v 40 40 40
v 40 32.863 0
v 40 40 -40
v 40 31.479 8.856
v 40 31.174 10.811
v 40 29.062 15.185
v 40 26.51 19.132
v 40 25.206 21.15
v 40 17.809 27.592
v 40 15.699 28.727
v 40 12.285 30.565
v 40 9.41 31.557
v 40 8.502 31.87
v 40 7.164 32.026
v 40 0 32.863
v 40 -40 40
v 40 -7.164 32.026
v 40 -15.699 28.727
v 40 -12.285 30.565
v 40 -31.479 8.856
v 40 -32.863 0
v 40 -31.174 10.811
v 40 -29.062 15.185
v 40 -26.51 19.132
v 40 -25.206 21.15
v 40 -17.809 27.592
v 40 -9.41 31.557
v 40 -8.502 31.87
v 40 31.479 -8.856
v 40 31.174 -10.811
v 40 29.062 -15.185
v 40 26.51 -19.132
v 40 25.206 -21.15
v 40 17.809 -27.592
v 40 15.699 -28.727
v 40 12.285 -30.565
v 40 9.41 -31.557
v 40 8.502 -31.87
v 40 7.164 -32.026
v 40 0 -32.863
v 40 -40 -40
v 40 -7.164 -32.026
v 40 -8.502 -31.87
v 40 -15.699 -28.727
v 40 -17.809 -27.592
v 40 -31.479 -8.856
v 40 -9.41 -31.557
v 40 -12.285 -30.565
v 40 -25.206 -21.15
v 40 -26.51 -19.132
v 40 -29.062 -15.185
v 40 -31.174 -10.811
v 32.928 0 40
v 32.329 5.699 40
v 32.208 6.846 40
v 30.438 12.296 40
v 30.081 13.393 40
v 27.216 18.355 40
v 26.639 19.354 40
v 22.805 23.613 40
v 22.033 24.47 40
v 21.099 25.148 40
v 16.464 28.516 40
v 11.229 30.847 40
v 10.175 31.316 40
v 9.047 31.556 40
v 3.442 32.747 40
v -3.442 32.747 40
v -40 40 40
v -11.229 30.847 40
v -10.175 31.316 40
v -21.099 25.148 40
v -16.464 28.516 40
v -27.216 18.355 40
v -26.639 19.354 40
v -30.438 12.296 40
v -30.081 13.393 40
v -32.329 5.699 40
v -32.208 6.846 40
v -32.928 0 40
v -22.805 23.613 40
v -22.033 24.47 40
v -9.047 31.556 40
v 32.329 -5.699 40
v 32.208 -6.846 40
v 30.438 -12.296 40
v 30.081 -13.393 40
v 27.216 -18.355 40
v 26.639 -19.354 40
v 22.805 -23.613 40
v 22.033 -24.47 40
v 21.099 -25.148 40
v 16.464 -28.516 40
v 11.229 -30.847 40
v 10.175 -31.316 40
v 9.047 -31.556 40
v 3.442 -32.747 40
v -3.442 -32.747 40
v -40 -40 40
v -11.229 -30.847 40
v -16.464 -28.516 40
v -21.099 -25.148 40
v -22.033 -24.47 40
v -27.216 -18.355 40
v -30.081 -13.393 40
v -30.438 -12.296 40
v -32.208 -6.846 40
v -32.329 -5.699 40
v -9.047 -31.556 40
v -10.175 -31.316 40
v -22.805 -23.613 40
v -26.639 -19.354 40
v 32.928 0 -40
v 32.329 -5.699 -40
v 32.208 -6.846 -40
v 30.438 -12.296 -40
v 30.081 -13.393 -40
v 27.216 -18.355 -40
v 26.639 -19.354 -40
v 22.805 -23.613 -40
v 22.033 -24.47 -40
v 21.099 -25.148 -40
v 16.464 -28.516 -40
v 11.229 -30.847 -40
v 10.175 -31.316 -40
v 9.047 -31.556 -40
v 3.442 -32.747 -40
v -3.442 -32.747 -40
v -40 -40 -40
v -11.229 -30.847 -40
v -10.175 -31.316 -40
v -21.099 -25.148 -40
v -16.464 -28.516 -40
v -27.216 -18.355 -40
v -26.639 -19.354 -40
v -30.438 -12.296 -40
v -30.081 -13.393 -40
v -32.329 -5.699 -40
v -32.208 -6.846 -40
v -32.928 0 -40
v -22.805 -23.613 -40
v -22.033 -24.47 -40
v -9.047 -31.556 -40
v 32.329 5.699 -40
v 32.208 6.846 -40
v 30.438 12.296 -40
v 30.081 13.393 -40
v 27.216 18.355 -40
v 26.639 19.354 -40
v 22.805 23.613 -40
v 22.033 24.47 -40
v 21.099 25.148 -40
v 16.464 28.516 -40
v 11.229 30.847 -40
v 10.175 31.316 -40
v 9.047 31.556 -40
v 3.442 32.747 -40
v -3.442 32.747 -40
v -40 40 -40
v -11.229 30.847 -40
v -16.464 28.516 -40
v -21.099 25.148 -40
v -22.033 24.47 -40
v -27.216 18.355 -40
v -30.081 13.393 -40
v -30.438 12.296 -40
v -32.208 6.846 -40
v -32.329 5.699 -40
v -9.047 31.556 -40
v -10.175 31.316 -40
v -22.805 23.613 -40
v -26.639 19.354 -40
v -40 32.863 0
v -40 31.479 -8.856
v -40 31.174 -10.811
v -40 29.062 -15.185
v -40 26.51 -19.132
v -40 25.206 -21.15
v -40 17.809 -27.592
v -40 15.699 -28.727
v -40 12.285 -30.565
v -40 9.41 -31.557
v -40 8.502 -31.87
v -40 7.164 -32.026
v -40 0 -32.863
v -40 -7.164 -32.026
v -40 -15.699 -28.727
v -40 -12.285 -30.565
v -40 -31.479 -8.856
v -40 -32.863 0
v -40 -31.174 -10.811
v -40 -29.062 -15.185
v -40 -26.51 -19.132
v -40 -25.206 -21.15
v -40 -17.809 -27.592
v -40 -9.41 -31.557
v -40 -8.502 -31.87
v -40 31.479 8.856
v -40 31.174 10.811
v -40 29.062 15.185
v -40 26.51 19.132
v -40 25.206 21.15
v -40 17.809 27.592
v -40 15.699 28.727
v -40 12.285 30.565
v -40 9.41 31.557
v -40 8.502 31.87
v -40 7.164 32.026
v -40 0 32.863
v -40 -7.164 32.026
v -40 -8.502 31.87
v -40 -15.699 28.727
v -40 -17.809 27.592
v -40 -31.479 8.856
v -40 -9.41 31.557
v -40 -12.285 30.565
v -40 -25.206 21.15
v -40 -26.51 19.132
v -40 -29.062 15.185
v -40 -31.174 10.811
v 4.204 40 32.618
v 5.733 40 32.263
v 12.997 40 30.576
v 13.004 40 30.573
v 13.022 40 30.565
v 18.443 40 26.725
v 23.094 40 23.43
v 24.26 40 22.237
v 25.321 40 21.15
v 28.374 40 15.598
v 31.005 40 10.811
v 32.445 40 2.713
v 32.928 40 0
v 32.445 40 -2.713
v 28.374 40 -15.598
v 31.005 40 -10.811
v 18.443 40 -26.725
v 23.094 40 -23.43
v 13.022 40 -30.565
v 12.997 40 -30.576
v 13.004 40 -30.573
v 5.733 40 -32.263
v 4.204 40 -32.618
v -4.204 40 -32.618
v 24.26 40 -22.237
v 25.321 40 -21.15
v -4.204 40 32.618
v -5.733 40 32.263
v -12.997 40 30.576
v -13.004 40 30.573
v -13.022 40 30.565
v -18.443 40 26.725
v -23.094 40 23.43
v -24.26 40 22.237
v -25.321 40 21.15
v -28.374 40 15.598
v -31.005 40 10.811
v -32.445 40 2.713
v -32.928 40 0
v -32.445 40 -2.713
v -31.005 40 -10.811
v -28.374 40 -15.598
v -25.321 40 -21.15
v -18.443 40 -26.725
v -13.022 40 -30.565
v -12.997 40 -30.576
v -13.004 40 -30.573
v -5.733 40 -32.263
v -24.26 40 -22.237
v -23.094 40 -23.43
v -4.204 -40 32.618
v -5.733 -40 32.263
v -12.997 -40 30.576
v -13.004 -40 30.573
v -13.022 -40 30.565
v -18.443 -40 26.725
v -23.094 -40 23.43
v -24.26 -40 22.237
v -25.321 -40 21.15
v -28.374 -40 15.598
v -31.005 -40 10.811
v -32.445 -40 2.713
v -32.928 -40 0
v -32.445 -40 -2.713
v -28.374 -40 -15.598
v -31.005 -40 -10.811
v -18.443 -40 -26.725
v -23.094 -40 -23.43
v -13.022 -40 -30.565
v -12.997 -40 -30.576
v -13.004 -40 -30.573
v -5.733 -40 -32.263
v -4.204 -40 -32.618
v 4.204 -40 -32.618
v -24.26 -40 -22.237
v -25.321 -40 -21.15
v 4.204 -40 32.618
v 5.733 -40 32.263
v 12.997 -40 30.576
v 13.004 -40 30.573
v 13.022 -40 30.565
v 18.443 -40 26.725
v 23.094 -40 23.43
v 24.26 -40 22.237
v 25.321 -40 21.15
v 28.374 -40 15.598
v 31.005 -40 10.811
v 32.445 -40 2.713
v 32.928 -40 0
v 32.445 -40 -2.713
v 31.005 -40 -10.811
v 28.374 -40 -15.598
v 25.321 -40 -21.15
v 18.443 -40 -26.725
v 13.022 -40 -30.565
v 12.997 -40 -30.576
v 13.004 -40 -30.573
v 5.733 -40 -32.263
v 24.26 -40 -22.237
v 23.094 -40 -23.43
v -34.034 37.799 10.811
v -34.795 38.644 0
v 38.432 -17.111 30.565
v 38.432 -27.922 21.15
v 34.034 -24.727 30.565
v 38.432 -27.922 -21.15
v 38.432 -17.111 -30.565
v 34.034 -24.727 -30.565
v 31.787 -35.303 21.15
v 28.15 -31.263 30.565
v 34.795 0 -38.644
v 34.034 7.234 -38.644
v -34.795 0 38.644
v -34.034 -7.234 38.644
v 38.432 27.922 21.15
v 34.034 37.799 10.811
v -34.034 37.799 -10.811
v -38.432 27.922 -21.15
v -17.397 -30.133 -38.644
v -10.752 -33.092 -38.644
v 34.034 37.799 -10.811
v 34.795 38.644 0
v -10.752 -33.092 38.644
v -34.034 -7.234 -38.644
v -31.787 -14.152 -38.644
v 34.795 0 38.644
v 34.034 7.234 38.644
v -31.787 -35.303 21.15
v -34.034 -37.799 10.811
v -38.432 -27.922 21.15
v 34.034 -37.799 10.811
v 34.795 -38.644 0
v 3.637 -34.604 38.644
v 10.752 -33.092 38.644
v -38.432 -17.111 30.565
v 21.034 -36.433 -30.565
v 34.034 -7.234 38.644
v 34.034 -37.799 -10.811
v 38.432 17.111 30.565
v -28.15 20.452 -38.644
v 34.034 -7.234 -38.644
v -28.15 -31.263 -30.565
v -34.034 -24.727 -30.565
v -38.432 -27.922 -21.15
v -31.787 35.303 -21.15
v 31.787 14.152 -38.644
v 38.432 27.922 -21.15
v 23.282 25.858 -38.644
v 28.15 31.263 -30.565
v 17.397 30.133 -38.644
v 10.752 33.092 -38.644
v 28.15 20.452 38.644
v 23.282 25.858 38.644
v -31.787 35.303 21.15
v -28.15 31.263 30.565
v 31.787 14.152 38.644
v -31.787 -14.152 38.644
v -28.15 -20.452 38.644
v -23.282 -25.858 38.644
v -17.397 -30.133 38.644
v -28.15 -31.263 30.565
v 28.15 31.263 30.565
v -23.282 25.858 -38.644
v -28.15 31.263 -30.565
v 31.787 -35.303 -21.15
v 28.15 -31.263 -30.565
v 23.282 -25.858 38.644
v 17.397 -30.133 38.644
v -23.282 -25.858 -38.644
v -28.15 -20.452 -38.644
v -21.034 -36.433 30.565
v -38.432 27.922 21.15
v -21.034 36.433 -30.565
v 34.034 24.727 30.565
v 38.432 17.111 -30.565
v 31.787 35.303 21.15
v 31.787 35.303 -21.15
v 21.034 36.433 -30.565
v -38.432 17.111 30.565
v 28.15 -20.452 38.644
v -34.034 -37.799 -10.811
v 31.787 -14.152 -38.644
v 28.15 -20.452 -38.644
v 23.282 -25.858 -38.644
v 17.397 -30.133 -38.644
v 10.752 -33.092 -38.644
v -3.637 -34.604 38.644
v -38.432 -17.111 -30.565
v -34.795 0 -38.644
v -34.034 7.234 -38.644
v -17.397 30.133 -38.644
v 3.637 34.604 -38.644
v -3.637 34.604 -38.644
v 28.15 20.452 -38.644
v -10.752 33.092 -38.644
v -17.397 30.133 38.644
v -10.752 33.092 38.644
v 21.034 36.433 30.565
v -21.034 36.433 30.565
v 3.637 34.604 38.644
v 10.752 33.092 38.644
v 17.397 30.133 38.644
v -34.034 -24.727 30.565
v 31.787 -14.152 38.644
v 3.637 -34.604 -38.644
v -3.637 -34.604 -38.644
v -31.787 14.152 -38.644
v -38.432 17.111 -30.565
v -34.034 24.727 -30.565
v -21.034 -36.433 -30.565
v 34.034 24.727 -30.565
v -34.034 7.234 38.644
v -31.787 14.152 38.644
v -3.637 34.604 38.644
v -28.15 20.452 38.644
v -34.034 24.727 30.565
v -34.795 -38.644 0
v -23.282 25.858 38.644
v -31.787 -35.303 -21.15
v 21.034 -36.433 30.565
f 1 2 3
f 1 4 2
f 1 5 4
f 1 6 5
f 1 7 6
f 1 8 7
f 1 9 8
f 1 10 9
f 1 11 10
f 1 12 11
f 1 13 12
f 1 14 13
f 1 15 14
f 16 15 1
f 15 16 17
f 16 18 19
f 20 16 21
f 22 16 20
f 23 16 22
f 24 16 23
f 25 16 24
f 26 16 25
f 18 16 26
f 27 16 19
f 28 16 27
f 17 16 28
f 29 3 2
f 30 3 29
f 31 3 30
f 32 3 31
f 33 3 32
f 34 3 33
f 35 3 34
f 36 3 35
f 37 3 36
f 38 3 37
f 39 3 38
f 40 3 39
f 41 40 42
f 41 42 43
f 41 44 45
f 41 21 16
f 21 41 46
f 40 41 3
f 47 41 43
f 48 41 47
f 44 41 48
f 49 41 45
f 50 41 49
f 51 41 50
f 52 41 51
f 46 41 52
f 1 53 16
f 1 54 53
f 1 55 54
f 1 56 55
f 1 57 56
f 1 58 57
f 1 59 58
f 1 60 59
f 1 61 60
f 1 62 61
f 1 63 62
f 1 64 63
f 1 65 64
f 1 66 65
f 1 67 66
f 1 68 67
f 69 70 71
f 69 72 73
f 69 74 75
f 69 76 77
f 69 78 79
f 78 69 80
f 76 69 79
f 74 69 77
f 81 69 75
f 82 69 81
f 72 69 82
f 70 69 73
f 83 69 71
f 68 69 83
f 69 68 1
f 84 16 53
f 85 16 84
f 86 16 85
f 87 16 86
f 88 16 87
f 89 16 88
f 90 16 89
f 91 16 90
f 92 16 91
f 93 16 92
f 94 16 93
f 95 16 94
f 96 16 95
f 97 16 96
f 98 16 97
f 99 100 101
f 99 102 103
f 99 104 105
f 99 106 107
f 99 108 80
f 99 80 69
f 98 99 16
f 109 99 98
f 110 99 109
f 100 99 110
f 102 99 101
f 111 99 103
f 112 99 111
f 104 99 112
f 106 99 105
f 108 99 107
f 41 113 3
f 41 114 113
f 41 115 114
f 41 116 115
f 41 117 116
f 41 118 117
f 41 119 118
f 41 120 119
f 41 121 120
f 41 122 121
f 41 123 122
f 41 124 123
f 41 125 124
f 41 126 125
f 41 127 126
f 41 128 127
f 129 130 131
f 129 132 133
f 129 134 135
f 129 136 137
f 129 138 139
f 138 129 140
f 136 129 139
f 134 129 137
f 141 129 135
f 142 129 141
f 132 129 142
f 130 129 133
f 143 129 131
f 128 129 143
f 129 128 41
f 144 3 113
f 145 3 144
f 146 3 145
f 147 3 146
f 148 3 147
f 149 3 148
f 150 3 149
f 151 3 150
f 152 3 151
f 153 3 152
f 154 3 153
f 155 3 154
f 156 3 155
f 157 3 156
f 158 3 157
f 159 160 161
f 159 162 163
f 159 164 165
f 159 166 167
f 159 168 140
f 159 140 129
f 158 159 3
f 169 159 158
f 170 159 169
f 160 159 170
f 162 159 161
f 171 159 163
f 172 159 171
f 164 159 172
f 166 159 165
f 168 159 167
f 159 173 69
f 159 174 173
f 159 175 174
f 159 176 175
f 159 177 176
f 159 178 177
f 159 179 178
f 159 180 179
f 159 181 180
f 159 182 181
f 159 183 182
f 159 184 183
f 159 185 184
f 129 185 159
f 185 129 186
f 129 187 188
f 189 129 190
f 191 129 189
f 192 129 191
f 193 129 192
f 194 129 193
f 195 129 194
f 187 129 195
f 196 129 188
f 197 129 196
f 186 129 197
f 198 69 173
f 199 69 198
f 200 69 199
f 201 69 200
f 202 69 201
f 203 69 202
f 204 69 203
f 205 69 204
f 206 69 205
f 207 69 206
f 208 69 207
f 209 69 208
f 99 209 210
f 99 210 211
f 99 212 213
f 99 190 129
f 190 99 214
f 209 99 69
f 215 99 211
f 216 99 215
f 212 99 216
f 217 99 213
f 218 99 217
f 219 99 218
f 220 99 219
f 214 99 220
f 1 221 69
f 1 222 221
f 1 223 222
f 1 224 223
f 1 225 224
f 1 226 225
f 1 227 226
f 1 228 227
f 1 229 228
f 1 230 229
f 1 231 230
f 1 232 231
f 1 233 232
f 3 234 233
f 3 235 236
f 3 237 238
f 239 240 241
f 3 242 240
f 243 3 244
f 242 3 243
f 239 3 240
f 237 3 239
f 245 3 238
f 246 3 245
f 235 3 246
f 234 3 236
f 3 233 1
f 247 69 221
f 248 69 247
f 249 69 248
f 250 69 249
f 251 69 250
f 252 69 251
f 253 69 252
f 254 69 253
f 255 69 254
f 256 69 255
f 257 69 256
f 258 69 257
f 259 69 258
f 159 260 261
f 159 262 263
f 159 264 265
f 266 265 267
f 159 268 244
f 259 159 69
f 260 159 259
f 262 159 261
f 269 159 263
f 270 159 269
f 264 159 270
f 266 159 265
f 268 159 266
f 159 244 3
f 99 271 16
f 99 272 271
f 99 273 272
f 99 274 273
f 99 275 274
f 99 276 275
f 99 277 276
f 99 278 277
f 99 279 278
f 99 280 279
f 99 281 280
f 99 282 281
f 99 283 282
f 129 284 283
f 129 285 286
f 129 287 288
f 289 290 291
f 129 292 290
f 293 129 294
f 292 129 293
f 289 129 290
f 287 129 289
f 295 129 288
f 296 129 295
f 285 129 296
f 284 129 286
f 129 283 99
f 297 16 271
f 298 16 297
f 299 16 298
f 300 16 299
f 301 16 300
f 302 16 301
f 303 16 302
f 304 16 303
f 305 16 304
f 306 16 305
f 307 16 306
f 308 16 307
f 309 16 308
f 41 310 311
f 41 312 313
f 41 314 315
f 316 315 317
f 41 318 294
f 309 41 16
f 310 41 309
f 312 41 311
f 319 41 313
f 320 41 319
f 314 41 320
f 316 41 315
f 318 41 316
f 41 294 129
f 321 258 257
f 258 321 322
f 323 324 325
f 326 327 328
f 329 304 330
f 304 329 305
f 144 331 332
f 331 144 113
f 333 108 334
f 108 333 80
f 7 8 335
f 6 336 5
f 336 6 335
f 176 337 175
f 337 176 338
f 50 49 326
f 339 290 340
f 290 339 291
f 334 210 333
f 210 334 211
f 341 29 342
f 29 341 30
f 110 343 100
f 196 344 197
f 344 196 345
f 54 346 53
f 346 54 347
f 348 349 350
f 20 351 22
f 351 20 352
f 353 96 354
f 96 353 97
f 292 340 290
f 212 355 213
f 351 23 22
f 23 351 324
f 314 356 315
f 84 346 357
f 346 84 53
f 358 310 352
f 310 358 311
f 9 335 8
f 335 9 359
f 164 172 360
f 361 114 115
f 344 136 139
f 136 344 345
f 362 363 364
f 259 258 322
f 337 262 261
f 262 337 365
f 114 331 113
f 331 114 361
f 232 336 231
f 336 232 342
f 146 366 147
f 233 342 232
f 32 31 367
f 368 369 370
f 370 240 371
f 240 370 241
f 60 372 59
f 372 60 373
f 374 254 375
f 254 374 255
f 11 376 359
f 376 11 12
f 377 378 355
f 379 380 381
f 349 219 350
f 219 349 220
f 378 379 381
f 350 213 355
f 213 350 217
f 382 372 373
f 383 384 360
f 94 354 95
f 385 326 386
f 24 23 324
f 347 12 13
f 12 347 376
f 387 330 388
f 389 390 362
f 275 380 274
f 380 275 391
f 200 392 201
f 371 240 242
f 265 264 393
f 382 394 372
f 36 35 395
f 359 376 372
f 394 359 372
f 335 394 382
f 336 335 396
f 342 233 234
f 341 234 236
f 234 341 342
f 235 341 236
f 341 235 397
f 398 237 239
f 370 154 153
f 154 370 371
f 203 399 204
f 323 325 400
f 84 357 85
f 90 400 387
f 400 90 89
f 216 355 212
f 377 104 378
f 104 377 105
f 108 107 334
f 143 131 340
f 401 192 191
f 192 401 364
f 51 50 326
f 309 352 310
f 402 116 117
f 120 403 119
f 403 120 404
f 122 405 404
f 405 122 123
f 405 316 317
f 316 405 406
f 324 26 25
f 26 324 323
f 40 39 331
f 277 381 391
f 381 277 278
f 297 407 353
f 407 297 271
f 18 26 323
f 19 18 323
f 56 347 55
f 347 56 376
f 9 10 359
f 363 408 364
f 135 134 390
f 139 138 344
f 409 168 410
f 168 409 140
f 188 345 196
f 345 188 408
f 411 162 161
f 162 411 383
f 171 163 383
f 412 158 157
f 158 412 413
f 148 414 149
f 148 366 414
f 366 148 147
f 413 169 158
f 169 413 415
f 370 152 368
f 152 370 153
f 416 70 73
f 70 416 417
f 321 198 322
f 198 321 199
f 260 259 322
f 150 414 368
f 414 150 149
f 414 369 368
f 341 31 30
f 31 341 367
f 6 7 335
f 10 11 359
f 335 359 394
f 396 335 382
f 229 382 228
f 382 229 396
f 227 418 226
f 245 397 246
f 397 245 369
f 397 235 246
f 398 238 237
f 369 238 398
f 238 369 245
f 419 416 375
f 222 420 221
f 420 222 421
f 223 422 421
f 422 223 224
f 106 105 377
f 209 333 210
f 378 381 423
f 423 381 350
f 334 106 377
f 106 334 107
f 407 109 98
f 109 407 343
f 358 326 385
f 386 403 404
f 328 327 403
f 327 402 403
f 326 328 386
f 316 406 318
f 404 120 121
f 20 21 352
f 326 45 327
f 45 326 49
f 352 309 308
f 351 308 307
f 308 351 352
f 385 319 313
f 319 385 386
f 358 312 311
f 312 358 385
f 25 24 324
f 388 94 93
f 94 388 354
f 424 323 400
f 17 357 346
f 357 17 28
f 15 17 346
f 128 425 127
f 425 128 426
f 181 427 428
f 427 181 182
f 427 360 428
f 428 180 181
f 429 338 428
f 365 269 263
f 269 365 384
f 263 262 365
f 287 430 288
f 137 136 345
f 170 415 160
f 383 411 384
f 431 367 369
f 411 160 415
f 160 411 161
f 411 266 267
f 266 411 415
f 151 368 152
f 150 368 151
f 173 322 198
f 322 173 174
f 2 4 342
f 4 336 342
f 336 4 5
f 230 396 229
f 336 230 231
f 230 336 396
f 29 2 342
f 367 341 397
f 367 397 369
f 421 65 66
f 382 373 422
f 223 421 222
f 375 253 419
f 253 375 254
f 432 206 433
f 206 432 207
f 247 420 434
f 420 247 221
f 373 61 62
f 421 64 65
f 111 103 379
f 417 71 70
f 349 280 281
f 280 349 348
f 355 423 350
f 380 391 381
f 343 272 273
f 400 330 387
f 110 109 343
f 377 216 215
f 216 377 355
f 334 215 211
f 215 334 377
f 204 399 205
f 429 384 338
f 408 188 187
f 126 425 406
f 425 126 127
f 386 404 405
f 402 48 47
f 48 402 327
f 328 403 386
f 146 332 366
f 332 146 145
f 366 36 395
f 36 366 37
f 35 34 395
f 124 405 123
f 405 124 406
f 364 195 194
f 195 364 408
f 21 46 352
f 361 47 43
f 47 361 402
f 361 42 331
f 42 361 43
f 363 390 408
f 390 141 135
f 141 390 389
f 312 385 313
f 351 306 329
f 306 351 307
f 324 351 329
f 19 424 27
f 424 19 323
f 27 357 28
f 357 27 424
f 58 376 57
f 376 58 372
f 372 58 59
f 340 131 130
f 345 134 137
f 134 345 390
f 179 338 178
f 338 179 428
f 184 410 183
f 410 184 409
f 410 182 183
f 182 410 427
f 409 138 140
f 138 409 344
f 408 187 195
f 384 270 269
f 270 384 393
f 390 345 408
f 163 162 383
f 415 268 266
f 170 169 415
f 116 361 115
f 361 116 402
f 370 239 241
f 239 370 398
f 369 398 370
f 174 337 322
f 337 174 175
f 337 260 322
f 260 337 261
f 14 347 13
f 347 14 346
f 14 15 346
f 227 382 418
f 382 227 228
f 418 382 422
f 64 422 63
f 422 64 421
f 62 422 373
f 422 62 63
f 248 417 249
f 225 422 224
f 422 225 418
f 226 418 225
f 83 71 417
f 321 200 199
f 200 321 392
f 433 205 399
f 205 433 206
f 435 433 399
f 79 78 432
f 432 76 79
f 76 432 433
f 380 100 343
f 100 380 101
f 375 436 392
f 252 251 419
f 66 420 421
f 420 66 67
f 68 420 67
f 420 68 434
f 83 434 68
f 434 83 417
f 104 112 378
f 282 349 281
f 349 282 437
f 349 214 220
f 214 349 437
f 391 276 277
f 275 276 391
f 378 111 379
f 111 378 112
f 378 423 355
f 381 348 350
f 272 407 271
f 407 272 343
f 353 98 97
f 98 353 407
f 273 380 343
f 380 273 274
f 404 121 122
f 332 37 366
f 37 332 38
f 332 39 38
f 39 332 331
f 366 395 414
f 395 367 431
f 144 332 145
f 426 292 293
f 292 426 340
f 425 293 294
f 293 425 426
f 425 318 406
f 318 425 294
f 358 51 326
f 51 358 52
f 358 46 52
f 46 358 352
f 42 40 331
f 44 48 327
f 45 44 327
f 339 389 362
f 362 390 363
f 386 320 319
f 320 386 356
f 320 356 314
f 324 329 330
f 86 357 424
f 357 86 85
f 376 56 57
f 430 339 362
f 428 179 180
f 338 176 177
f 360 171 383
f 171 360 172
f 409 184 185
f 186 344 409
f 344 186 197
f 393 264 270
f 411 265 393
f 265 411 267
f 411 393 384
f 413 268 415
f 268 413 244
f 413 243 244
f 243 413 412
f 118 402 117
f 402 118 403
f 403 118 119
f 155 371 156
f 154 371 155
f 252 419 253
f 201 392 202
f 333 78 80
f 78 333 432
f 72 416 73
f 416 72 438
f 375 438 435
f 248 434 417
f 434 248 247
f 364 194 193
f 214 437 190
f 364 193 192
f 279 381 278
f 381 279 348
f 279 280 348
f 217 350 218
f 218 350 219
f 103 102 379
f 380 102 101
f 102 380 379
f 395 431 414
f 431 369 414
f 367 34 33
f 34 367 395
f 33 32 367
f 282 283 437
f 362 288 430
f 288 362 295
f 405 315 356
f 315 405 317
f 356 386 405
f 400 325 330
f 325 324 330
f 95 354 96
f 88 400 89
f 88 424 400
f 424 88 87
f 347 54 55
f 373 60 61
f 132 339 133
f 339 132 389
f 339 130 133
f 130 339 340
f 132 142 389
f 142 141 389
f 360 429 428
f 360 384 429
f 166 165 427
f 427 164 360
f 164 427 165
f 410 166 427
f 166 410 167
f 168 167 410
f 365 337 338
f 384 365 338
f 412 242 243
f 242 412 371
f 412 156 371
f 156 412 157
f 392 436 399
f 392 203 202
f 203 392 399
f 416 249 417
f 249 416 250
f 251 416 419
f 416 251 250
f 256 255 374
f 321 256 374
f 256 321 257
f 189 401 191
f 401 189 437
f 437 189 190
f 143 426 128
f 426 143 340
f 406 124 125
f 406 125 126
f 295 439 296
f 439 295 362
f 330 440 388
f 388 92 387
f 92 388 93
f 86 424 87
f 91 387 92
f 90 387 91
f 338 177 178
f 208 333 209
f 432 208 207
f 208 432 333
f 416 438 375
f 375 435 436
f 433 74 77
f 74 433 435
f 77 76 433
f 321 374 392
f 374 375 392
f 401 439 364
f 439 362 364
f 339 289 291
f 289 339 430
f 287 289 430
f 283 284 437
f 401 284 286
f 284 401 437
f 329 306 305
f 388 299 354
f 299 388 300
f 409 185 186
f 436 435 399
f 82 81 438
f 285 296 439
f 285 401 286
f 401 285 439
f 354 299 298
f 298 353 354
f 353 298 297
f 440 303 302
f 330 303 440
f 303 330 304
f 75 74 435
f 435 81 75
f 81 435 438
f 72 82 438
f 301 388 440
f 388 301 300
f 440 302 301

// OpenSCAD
difference()
  {
    cube([80,80,80], center=true);
    sphere(52);
  }
